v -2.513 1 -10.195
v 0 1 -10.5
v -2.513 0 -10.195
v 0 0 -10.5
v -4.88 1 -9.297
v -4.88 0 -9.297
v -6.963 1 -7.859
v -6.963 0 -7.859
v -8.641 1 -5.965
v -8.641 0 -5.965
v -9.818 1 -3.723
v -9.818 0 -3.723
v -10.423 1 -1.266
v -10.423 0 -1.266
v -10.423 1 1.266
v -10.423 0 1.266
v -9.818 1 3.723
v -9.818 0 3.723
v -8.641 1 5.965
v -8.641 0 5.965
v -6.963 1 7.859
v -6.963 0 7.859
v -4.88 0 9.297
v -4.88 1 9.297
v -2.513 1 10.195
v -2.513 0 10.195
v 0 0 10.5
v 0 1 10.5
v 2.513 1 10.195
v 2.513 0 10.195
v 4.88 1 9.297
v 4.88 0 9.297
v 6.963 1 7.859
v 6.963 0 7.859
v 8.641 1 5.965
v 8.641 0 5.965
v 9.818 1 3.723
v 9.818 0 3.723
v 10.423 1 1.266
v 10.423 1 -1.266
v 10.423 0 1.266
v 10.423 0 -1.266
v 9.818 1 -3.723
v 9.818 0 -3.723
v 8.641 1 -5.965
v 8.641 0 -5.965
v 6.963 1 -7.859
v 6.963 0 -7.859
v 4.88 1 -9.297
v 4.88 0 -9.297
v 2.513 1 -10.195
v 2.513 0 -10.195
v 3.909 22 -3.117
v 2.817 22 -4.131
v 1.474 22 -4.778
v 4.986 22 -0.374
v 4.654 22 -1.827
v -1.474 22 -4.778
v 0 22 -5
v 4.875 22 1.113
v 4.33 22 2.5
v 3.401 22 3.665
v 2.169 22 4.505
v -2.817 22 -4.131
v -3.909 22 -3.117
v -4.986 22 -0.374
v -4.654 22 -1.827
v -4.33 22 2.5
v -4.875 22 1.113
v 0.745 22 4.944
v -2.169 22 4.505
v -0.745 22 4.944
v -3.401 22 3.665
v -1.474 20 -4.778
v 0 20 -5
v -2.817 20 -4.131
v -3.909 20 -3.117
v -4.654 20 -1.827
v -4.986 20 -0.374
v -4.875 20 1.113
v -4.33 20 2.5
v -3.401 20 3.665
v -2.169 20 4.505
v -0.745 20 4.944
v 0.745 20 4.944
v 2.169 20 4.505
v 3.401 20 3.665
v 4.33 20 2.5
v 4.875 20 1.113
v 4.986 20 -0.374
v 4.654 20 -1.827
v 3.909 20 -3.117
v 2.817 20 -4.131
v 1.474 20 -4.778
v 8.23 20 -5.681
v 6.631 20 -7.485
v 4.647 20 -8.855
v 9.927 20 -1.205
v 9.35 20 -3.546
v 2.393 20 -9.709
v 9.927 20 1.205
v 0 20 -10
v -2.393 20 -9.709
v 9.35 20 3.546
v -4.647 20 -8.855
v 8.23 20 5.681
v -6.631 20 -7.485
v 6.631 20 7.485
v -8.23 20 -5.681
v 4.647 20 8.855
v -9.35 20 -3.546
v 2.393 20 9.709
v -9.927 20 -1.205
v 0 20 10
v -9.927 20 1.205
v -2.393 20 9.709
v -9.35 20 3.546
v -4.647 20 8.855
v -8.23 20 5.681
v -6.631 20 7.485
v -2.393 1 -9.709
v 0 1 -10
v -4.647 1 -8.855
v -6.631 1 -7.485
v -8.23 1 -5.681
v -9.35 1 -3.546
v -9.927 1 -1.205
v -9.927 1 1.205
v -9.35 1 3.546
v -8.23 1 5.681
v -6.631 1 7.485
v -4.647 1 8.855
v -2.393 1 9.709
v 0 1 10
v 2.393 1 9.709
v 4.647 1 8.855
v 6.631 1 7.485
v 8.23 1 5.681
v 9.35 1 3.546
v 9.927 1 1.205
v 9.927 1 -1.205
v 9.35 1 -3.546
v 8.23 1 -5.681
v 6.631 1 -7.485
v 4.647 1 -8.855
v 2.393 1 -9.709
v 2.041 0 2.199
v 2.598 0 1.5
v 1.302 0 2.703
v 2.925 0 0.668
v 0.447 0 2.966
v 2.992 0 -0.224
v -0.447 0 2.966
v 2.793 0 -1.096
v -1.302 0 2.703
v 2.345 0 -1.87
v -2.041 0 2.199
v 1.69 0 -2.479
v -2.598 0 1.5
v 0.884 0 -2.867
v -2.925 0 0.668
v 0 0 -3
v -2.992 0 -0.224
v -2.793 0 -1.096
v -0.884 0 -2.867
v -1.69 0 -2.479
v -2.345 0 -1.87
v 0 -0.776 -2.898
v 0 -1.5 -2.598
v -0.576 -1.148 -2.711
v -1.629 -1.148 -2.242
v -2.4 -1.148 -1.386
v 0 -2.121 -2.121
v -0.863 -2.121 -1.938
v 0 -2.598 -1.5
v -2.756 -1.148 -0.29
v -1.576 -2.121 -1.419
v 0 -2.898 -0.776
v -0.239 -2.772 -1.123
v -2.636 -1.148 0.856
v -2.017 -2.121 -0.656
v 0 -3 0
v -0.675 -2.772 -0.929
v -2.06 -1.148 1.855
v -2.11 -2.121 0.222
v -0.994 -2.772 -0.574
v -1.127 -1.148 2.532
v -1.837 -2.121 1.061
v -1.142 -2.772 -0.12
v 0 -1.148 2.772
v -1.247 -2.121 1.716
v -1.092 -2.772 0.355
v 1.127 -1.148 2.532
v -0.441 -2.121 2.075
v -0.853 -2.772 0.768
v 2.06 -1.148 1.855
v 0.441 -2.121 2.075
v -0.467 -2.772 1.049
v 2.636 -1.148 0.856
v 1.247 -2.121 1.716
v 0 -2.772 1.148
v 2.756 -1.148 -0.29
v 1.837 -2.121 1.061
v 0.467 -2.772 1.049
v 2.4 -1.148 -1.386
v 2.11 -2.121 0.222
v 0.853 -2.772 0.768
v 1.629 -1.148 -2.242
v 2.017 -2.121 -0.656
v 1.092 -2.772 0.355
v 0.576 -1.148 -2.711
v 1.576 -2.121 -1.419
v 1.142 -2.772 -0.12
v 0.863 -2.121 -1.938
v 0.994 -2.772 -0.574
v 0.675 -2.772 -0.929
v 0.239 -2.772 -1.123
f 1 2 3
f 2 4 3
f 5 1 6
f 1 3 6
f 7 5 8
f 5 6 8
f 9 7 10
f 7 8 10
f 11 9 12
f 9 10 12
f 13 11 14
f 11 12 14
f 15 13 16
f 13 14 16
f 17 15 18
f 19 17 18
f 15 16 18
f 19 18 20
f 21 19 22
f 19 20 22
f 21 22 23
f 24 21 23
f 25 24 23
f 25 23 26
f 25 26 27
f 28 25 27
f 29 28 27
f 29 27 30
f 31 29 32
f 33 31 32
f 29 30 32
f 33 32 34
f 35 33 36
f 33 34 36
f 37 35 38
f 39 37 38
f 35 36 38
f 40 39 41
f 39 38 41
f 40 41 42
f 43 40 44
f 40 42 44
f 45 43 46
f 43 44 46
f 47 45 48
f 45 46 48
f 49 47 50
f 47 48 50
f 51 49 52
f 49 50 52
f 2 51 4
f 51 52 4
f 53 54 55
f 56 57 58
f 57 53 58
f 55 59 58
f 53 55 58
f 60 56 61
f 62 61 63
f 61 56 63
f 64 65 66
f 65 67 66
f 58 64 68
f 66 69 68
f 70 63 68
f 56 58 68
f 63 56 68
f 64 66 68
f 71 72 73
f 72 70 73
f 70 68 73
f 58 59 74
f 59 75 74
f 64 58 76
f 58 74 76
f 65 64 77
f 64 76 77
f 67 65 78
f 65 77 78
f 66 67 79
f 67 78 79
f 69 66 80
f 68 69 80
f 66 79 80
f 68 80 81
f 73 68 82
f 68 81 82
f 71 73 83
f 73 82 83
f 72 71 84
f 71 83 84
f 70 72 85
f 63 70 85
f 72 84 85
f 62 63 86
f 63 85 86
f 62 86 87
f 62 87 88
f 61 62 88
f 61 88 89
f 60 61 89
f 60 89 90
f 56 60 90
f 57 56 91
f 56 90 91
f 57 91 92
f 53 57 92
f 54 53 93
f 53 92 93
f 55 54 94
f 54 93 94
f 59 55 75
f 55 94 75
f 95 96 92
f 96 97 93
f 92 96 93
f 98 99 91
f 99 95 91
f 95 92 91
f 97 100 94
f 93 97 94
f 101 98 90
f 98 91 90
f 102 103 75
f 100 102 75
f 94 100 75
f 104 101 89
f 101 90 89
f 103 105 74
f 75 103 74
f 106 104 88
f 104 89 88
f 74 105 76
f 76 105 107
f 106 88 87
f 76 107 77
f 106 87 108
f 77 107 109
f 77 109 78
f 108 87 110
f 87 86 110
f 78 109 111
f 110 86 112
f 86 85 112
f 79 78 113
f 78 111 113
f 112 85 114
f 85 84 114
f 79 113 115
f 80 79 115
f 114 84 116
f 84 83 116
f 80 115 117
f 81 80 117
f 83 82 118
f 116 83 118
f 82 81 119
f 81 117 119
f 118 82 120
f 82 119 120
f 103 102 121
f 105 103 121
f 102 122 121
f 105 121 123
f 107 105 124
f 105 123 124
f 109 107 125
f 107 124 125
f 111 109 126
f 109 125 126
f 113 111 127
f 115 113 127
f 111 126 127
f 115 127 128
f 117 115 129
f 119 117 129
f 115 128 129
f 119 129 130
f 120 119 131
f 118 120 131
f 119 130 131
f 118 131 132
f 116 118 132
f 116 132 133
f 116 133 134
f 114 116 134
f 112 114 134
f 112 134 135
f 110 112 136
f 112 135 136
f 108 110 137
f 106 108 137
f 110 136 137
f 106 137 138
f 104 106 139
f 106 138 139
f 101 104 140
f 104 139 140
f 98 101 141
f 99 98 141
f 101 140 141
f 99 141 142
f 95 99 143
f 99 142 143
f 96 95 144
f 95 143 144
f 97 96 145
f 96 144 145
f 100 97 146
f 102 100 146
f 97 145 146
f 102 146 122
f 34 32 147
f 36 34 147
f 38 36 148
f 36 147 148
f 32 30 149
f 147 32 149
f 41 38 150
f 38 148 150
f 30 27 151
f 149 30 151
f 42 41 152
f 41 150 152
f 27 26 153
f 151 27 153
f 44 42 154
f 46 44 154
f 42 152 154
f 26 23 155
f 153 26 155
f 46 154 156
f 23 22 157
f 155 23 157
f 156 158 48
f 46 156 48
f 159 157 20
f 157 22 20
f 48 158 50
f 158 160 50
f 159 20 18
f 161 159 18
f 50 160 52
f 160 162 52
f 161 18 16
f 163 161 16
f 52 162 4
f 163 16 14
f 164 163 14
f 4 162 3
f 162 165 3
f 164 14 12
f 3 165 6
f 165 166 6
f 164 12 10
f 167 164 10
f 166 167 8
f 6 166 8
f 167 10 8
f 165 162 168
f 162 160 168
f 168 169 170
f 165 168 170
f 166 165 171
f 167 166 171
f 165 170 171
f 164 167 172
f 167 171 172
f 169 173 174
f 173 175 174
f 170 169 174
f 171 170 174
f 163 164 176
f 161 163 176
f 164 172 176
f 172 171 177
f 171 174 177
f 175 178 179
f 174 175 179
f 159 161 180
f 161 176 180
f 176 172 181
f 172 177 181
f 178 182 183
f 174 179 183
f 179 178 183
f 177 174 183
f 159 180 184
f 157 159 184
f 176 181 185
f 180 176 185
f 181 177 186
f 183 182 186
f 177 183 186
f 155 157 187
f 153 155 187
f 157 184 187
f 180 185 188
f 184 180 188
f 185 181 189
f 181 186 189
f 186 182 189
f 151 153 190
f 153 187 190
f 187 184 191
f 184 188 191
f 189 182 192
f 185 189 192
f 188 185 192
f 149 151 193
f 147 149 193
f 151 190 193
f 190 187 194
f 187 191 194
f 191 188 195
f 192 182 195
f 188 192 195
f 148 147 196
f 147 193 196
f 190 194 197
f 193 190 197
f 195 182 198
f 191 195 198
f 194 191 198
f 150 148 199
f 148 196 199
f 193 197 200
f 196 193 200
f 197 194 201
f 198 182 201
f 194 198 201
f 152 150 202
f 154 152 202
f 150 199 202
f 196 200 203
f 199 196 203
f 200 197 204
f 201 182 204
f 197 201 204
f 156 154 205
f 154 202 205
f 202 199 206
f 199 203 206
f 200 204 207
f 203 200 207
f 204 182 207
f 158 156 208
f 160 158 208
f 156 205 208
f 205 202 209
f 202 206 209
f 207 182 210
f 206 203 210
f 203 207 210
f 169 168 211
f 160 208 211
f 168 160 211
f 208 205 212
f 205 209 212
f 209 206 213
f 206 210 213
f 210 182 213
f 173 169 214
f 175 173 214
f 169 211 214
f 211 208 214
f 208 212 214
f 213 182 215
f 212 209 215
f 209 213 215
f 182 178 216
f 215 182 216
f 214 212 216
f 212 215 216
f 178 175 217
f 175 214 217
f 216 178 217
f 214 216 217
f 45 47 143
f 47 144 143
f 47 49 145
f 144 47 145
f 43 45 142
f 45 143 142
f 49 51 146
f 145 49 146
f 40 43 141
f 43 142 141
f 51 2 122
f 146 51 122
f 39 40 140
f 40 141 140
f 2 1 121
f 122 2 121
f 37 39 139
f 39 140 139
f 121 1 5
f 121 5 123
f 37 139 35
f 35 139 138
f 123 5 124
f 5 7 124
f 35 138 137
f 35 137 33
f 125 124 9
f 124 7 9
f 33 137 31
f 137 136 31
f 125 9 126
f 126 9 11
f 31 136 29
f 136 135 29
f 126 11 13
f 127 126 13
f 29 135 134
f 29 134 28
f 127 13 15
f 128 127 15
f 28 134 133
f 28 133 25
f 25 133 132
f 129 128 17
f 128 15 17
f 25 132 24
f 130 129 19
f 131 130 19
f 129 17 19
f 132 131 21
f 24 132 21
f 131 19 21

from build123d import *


with BuildPart() as part:
    # Esquisse1 → Révolution1 (revolve)
    with BuildSketch(Plane(origin=(0, 0, 0), x_dir=(0, 0, -1), z_dir=(1, 0, 0))):
        with BuildLine():
            Line((10.5, 0), (3, 0))
            ThreePointArc((3, 0), (2.121320344, -2.121320344), (0, -3))
            Line((0, -3), (0, 0))
            Line((0, 0), (0, 20))
            Line((0, 20), (0, 22))
            Line((0, 22), (5, 22))
            Line((5, 22), (5, 20))
            Line((5, 20), (10, 20))
            Line((10, 20), (10, 1))
            Line((10, 1), (10.5, 1))
            Line((10.5, 1), (10.5, 0))
        make_face()
    revolve(axis=Axis((0, 0, 0), (0, 1, 0)))


solid = part.part
